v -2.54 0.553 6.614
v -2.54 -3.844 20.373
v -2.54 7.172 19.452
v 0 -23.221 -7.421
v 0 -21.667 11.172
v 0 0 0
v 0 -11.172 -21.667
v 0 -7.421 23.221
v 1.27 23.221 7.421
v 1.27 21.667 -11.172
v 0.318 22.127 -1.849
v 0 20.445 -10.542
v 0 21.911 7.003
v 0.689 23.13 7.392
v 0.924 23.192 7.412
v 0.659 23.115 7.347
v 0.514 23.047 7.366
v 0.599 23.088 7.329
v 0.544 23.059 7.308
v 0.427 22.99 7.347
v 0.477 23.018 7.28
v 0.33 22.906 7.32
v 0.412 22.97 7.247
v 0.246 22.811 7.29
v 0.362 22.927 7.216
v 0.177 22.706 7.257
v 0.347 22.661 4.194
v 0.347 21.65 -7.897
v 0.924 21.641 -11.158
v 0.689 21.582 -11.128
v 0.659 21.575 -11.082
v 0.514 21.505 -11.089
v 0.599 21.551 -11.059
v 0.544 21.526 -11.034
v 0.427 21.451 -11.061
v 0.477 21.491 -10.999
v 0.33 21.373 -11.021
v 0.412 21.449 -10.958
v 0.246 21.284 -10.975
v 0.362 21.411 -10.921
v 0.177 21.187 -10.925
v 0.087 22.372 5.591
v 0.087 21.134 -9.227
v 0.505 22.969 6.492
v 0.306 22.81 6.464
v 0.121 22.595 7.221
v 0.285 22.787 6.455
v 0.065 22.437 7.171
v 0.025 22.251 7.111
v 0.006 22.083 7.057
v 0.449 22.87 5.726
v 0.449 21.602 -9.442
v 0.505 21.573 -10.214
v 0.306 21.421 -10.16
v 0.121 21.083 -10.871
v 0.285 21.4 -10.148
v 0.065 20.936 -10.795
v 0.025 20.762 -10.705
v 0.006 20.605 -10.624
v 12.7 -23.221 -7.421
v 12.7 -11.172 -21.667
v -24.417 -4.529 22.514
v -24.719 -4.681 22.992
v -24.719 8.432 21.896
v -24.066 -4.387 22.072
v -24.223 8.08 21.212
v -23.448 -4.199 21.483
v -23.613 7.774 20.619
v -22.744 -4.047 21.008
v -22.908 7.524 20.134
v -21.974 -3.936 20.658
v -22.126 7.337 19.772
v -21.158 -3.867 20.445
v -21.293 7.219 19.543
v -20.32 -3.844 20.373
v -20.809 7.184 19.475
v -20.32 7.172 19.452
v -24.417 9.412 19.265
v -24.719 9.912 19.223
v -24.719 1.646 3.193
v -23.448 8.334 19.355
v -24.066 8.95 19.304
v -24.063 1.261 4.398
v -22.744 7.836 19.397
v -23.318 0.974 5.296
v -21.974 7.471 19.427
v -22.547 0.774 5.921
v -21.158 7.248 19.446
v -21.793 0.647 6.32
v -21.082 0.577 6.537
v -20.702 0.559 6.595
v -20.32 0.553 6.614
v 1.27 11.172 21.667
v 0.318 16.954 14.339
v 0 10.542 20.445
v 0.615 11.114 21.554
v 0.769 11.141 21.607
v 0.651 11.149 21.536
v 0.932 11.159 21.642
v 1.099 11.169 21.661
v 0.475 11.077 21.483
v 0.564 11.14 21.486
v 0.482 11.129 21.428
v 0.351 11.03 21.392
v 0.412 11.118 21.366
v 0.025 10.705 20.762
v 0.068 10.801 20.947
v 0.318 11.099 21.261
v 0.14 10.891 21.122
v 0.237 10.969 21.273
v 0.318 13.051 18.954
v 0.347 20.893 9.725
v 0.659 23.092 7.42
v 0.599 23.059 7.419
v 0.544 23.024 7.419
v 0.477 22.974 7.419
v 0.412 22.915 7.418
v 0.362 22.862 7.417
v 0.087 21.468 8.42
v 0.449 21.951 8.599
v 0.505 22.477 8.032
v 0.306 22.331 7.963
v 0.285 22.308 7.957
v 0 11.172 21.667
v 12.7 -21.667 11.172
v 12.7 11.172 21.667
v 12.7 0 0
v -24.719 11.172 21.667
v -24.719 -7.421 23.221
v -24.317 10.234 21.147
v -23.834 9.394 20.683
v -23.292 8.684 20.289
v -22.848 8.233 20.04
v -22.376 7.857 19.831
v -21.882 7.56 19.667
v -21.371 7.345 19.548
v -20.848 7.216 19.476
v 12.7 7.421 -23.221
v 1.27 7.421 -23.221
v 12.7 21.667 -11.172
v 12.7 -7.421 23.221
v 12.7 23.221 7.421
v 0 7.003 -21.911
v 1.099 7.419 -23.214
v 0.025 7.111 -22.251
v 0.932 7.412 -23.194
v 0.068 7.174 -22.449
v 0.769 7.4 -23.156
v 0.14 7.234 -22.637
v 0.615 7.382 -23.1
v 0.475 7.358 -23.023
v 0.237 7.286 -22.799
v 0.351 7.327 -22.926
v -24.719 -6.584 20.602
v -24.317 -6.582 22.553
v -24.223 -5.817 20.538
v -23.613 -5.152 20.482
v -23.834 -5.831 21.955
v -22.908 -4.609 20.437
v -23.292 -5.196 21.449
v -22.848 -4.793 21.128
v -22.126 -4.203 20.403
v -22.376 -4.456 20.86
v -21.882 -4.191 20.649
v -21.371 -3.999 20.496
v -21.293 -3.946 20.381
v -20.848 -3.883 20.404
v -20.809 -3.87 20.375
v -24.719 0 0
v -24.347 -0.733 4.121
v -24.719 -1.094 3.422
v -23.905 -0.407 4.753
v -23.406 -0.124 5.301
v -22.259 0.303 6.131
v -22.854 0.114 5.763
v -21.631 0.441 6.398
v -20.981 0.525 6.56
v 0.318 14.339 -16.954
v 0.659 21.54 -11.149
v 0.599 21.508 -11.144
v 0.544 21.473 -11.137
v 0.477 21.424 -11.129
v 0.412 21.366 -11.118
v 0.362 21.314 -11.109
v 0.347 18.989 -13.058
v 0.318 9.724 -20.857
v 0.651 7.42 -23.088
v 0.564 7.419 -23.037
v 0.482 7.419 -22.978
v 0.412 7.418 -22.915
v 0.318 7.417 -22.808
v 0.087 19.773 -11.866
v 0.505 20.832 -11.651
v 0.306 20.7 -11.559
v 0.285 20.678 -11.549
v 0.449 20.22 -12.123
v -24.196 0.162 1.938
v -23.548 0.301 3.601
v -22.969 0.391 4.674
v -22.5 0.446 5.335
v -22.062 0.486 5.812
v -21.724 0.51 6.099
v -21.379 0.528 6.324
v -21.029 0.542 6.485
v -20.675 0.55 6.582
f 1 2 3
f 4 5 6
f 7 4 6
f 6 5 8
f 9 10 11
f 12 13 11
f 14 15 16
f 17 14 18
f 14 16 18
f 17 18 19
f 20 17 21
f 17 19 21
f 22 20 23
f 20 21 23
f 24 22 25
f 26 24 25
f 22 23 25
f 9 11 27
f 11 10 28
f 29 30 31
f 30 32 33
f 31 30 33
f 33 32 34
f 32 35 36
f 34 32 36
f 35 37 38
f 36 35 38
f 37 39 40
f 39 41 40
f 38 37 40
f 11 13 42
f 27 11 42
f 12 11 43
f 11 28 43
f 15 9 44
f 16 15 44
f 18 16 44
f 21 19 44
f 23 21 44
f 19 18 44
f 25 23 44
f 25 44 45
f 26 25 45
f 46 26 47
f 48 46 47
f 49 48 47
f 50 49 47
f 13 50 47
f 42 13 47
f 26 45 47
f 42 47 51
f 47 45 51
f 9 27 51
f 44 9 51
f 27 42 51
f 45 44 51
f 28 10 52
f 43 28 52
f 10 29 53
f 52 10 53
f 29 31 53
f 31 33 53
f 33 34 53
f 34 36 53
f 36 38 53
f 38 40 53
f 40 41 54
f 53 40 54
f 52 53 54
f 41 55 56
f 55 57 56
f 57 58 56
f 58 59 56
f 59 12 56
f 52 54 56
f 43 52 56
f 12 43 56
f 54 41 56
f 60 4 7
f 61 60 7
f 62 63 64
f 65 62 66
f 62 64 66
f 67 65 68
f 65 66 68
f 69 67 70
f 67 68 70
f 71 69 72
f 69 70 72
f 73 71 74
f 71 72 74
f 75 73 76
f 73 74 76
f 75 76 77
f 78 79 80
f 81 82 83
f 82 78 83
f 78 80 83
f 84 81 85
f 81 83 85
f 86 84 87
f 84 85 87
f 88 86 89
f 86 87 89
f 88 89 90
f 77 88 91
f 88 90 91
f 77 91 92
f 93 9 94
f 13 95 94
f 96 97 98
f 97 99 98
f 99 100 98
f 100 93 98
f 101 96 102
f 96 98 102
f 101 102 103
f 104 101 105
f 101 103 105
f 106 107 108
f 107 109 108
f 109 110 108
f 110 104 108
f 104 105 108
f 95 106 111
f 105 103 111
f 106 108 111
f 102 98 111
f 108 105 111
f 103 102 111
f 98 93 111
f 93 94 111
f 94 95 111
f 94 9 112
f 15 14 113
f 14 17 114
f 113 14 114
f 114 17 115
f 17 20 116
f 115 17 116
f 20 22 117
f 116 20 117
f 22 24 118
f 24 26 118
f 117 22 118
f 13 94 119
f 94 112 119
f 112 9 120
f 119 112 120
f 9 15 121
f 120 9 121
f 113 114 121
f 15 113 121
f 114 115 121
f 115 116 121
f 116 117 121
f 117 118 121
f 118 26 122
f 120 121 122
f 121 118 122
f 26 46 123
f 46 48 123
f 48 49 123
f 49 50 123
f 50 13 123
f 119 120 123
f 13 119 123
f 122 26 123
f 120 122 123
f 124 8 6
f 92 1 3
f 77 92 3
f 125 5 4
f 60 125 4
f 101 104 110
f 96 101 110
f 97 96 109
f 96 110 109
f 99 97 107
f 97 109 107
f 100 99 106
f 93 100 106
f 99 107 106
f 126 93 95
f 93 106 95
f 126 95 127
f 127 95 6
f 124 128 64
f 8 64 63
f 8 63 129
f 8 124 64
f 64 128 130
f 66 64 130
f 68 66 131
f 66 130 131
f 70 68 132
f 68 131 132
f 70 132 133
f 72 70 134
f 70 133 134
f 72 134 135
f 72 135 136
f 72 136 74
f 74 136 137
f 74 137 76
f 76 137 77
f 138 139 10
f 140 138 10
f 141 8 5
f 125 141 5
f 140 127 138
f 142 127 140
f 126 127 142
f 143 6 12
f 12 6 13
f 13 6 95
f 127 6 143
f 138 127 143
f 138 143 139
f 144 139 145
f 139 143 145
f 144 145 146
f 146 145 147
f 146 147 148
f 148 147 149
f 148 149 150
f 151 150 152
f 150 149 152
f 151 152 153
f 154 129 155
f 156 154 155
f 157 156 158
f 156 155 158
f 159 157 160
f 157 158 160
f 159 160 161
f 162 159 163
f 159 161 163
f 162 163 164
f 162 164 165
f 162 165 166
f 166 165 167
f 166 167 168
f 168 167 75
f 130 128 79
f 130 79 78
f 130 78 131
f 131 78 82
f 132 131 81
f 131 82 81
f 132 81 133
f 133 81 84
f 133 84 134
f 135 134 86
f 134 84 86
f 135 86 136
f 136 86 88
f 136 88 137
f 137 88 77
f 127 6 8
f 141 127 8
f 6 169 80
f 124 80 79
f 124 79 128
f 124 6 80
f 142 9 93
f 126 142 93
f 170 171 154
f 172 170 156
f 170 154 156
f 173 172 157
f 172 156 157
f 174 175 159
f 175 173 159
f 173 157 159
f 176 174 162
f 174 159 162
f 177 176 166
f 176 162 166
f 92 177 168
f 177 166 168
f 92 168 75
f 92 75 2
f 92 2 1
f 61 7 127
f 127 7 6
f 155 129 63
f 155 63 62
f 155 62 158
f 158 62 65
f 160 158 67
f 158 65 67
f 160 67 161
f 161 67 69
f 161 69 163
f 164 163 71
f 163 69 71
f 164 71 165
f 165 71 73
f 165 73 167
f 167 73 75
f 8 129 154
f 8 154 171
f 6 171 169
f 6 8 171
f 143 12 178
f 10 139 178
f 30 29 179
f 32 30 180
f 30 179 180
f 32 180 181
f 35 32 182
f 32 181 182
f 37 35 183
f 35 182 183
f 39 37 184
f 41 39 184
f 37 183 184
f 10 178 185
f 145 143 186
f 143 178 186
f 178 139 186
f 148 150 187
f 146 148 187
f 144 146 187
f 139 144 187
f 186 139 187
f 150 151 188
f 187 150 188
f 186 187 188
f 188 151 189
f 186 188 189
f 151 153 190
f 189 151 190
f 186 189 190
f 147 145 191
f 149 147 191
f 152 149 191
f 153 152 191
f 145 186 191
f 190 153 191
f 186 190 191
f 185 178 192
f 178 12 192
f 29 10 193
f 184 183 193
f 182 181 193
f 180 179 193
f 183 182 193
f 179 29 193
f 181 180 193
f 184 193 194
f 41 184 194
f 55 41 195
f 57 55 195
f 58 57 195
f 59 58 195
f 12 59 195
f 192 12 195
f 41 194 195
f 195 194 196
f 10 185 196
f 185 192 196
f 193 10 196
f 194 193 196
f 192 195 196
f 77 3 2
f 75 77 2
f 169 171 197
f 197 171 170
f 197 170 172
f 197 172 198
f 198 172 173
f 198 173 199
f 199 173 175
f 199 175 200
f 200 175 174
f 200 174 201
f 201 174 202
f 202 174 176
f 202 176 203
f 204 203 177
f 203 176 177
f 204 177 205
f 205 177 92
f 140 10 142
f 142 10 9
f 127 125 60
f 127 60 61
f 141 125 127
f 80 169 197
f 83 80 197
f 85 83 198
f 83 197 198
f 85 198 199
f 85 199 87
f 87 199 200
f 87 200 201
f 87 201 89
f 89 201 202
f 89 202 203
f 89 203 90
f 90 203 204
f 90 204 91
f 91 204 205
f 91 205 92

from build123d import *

# Parameters (mm, degrees)
F1_DEPTH     = 12.7
F2_DEPTH     = 25.4
F3_T1_DEPTH  = 25.0079243049
F3_T3_DEPTH  = 25.0079243049
F3_T5_DEPTH  = 25.0079243049
F4_T         = -2.54
F5_T4_DEPTH  = 36.4551670306
F5_T10_DEPTH = 39.8442718127
F5_T16_DEPTH = 39.8442718127
F5_T23_DEPTH = 36.4551670306
F5_T29_DEPTH = 39.8442718127
F5_T38_DEPTH = 36.4551670306
F5_T44_DEPTH = 39.8442718127
F5_T53_DEPTH = 39.8442718127
F5_T59_DEPTH = 39.8442718127


# Not quite as in the source:
# - a fillet or chamfer that OpenCascade refuses, or shapes differently, is made with other operations: its cross-section is extruded or revolved along the edge and cut away or added


with BuildPart() as f1:
    # F0 (on Right) → F1 (new body)
    with BuildSketch(Plane.YZ):
        Polygon((-7.4210610107, 23.220738357), (-21.6670241207, 11.1720589921), (-23.220738357, -7.4210610107), (-11.1720589921, -21.6670241207), (0, 0), align=None)
    extrude(amount=F1_DEPTH)


with BuildPart() as f1b:
    # F0 (on Right) → F1, piece 2 (new body)
    with BuildSketch(Plane.YZ):
        Polygon((23.220738357, 7.4210610107), (11.1720589921, 21.6670241207), (0, 0), (7.4210610107, -23.220738357), (21.6670241207, -11.1720589921), align=None)
    extrude(amount=F1_DEPTH)

    # F3: fillet of radius 1.27 on 3 edges, made by hand

    # F3_s2 → F3_t1 (cut)
    with BuildSketch(Plane(origin=(0, -9.5472026063, -8.074651194), x_dir=(1, 0, 0), z_dir=(0, 0.7635341894, 0.6457674052))):
        with BuildLine():
            add(Edge.make_bspline(
                [(1.27, 22.5221069513), (0, 22.5221069513), (0, 21.2521069513)],
                knots=[0, 0, 0, 1, 1, 1], degree=2, weights=[1, 1, 1]))
            Line((0, 21.2521069513), (0, 22.5221069513))
            Line((0, 22.5221069513), (1.27, 22.5221069513))
        make_face()
    extrude(amount=F3_T1_DEPTH, mode=Mode.SUBTRACT)

    # F3_s4 → F3_t3 (cut)
    with BuildSketch(Plane(origin=(0, -1.0412510893, -12.4605323193), x_dir=(1, 0, 0), z_dir=(0, 0.0832736917, 0.9965267143))):
        with BuildLine():
            add(Edge.make_bspline(
                [(1.27, 22.5221069513), (0, 22.5221069513), (0, 21.2521069513)],
                knots=[0, 0, 0, 1, 1, 1], degree=2, weights=[1, 1, 1]))
            Line((0, 21.2521069513), (0, 22.5221069513))
            Line((0, 22.5221069513), (1.27, 22.5221069513))
        make_face()
    extrude(amount=F3_T3_DEPTH, mode=Mode.SUBTRACT)

    # F3_s6 → F3_t5 (cut)
    with BuildSketch(Plane(origin=(0, 8.074651194, -9.5472026063), x_dir=(1, 0, 0), z_dir=(0, -0.6457674052, 0.7635341894))):
        with BuildLine():
            add(Edge.make_bspline(
                [(1.27, 22.5221069513), (0, 22.5221069513), (0, 21.2521069513)],
                knots=[0, 0, 0, 1, 1, 1], degree=2, weights=[1, 1, 1]))
            Line((0, 21.2521069513), (0, 22.5221069513))
            Line((0, 22.5221069513), (1.27, 22.5221069513))
        make_face()
    extrude(amount=F3_T5_DEPTH, mode=Mode.SUBTRACT)


with BuildPart() as f2:
    # F0 (on Right) → F2 (new body)
    with BuildSketch(Plane.YZ):
        Polygon((11.1720589921, 21.6670241207), (-7.4210610107, 23.220738357), (0, 0), align=None)
    extrude(amount=-F2_DEPTH)

    # F4
    f4_openings = [f2.faces().sort_by_distance(p)[0] for p in [
        (-25.4, 1.250333, 14.962587),
    ]]
    offset(amount=F4_T, openings=f4_openings)

    # F5: fillet of radius 5.08 on 3 edges, made by hand


with BuildPart() as f5_tool2:
    # F5_s3 → F5_t4 (new body)
    with BuildSketch(Plane(origin=(0, 18.1642739097, -1.5178781701), x_dir=(1, 0, 0), z_dir=(0, -0.9965267143, 0.0832736917))):
        with BuildLine():
            ThreePointArc((-25.4, 25.0621069513), (-23.9121024484, 21.4700045029), (-20.32, 19.9821069513))
            Line((-20.32, 19.9821069513), (-25.4, 19.9821069513))
            Line((-25.4, 19.9821069513), (-25.4, 25.0621069513))
        make_face()
    extrude(amount=F5_T4_DEPTH)

    split(bisect_by=Plane(origin=(0, 2.4194467666, 0.7732252864), x_dir=(1, 0, 0), z_dir=(0, 0.9525380971, 0.3044194041)), keep=Keep.TOP)

    split(bisect_by=Plane(origin=(0, -2.2575600588, 1.164054372), x_dir=(1, 0, 0), z_dir=(0, -0.8888031728, 0.4582891228)), keep=Keep.TOP)


with BuildPart() as f2_1:
    add(f2.part)

    # F5_t1: cut F5_tool2
    add(f5_tool2.part, mode=Mode.SUBTRACT)


with BuildPart() as f5_tool8:
    # F5_s9 → F5_t10 (new body)
    with BuildSketch(Plane(origin=(0, -3.0099960077, -5.8375681822), x_dir=(1, 0, 0), z_dir=(0, 0.4582891228, 0.8888031728))):
        with BuildLine():
            ThreePointArc((-25.4, 2.54), (-23.9121024484, -1.0521024484), (-20.32, -2.54))
            Line((-20.32, -2.54), (-25.4, -2.54))
            Line((-25.4, -2.54), (-25.4, 2.54))
        make_face()
    extrude(amount=F5_T10_DEPTH)

    split(bisect_by=Plane(origin=(0, 1.6639838138, 19.9127033846), x_dir=(1, 0, 0), z_dir=(0, -0.0832736917, -0.9965267143)), keep=Keep.TOP)

    split(bisect_by=Plane(origin=(0, 2.4194467666, 0.7732252864), x_dir=(1, 0, 0), z_dir=(0, 0.9525380971, 0.3044194041)), keep=Keep.TOP)


with BuildPart() as f2_2:
    add(f2_1.part)

    # F5_t7: cut F5_tool8
    add(f5_tool8.part, mode=Mode.SUBTRACT)


with BuildPart() as f5_tool14:
    # F5_s15 → F5_t16 (new body)
    with BuildSketch(Plane(origin=(0, -10.1299740234, 31.6970142166), x_dir=(1, 0, 0), z_dir=(0, 0.3044194041, -0.9525380971))):
        with BuildLine():
            ThreePointArc((-25.4, 2.54), (-23.9121024484, -1.0521024484), (-20.32, -2.54))
            Line((-20.32, -2.54), (-25.4, -2.54))
            Line((-25.4, -2.54), (-25.4, 2.54))
        make_face()
    extrude(amount=F5_T16_DEPTH)

    split(bisect_by=Plane(origin=(0, 1.6639838138, 19.9127033846), x_dir=(1, 0, 0), z_dir=(0, -0.0832736917, -0.9965267143)), keep=Keep.TOP)

    split(bisect_by=Plane(origin=(0, -2.2575600588, 1.164054372), x_dir=(1, 0, 0), z_dir=(0, -0.8888031728, 0.4582891228)), keep=Keep.TOP)


with BuildPart() as f2_3:
    add(f2_2.part)

    # F5_t13: cut F5_tool14
    add(f5_tool14.part, mode=Mode.SUBTRACT)


with BuildPart() as f5_tool21:
    # F5_s22 → F5_t23 (new body)
    with BuildSketch(Plane(origin=(0, 18.1642739097, -1.5178781701), x_dir=(1, 0, 0), z_dir=(0, -0.9965267143, 0.0832736917))):
        with BuildLine():
            ThreePointArc((-25.4, 25.0621069513), (-23.9121024484, 21.4700045029), (-20.32, 19.9821069513))
            Line((-20.32, 19.9821069513), (-25.4, 19.9821069513))
            Line((-25.4, 19.9821069513), (-25.4, 25.0621069513))
        make_face()
    extrude(amount=F5_T23_DEPTH)

    split(bisect_by=Plane(origin=(0, 1.8754989907, 22.4438812388), x_dir=(1, 0, 0), z_dir=(0, -0.0832736917, -0.9965267143)), keep=Keep.TOP)

    split(bisect_by=Plane(origin=(0, 0, 0), x_dir=(1, 0, 0), z_dir=(0, -0.8888031728, 0.4582891228)), keep=Keep.TOP)

    split(bisect_by=Plane(origin=(0, -2.2575600588, 1.164054372), x_dir=(1, 0, 0), z_dir=(0, 0.8888031728, -0.4582891228)), keep=Keep.TOP)


with BuildPart() as f5_tool27:
    # F5_s28 → F5_t29 (new body)
    with BuildSketch(Plane(origin=(0, -3.0099960077, -5.8375681822), x_dir=(1, 0, 0), z_dir=(0, 0.4582891228, 0.8888031728))):
        with BuildLine():
            ThreePointArc((-25.4, 2.54), (-23.9121024484, -1.0521024484), (-20.32, -2.54))
            Line((-20.32, -2.54), (-25.4, -2.54))
            Line((-25.4, -2.54), (-25.4, 2.54))
        make_face()
    extrude(amount=F5_T29_DEPTH)

    split(bisect_by=Plane(origin=(0, 1.8754989907, 22.4438812388), x_dir=(1, 0, 0), z_dir=(0, -0.0832736917, -0.9965267143)), keep=Keep.TOP)

    split(bisect_by=Plane(origin=(0, 0, 0), x_dir=(1, 0, 0), z_dir=(0, -0.8888031728, 0.4582891228)), keep=Keep.TOP)

    split(bisect_by=Plane(origin=(0, 1.6639838138, 19.9127033846), x_dir=(1, 0, 0), z_dir=(0, 0.0832736917, 0.9965267143)), keep=Keep.TOP)


with BuildPart() as f5_tool21_1:
    add(f5_tool21.part)

    # F5_t33: intersect F5_tool27
    add(f5_tool27.part, mode=Mode.INTERSECT)


with BuildPart() as f2_4:
    add(f2_3.part)

    # F5_t19: cut F5_tool21
    add(f5_tool21_1.part, mode=Mode.SUBTRACT)


with BuildPart() as f5_tool36:
    # F5_s37 → F5_t38 (new body)
    with BuildSketch(Plane(origin=(0, 18.1642739097, -1.5178781701), x_dir=(1, 0, 0), z_dir=(0, -0.9965267143, 0.0832736917))):
        with BuildLine():
            ThreePointArc((-25.4, 25.0621069513), (-23.9121024484, 21.4700045029), (-20.32, 19.9821069513))
            Line((-20.32, 19.9821069513), (-25.4, 19.9821069513))
            Line((-25.4, 19.9821069513), (-25.4, 25.0621069513))
        make_face()
    extrude(amount=F5_T38_DEPTH)

    split(bisect_by=Plane(origin=(0, 1.8754989907, 22.4438812388), x_dir=(1, 0, 0), z_dir=(0, -0.0832736917, -0.9965267143)), keep=Keep.TOP)

    split(bisect_by=Plane(origin=(0, 0, 0), x_dir=(1, 0, 0), z_dir=(0, 0.9525380971, 0.3044194041)), keep=Keep.TOP)

    split(bisect_by=Plane(origin=(0, 2.4194467666, 0.7732252864), x_dir=(1, 0, 0), z_dir=(0, -0.9525380971, -0.3044194041)), keep=Keep.TOP)


with BuildPart() as f5_tool42:
    # F5_s43 → F5_t44 (new body)
    with BuildSketch(Plane(origin=(0, -10.1299740234, 31.6970142166), x_dir=(1, 0, 0), z_dir=(0, 0.3044194041, -0.9525380971))):
        with BuildLine():
            ThreePointArc((-25.4, 2.54), (-23.9121024484, -1.0521024484), (-20.32, -2.54))
            Line((-20.32, -2.54), (-25.4, -2.54))
            Line((-25.4, -2.54), (-25.4, 2.54))
        make_face()
    extrude(amount=F5_T44_DEPTH)

    split(bisect_by=Plane(origin=(0, 1.8754989907, 22.4438812388), x_dir=(1, 0, 0), z_dir=(0, -0.0832736917, -0.9965267143)), keep=Keep.TOP)

    split(bisect_by=Plane(origin=(0, 0, 0), x_dir=(1, 0, 0), z_dir=(0, 0.9525380971, 0.3044194041)), keep=Keep.TOP)

    split(bisect_by=Plane(origin=(0, 1.6639838138, 19.9127033846), x_dir=(1, 0, 0), z_dir=(0, 0.0832736917, 0.9965267143)), keep=Keep.TOP)


with BuildPart() as f5_tool36_1:
    add(f5_tool36.part)

    # F5_t48: intersect F5_tool42
    add(f5_tool42.part, mode=Mode.INTERSECT)


with BuildPart() as f2_5:
    add(f2_4.part)

    # F5_t34: cut F5_tool36
    add(f5_tool36_1.part, mode=Mode.SUBTRACT)


with BuildPart() as f5_tool51:
    # F5_s52 → F5_t53 (new body)
    with BuildSketch(Plane(origin=(0, -3.0099960077, -5.8375681822), x_dir=(1, 0, 0), z_dir=(0, 0.4582891228, 0.8888031728))):
        with BuildLine():
            ThreePointArc((-25.4, 2.54), (-23.9121024484, -1.0521024484), (-20.32, -2.54))
            Line((-20.32, -2.54), (-25.4, -2.54))
            Line((-25.4, -2.54), (-25.4, 2.54))
        make_face()
    extrude(amount=F5_T53_DEPTH)

    split(bisect_by=Plane(origin=(0, 0, 0), x_dir=(1, 0, 0), z_dir=(0, 0.9525380971, 0.3044194041)), keep=Keep.TOP)

    split(bisect_by=Plane(origin=(0, 0, 0), x_dir=(1, 0, 0), z_dir=(0, -0.8888031728, 0.4582891228)), keep=Keep.TOP)

    split(bisect_by=Plane(origin=(0, 2.4194467666, 0.7732252864), x_dir=(1, 0, 0), z_dir=(0, -0.9525380971, -0.3044194041)), keep=Keep.TOP)


with BuildPart() as f5_tool57:
    # F5_s58 → F5_t59 (new body)
    with BuildSketch(Plane(origin=(0, -10.1299740234, 31.6970142166), x_dir=(1, 0, 0), z_dir=(0, 0.3044194041, -0.9525380971))):
        with BuildLine():
            ThreePointArc((-25.4, 2.54), (-23.9121024484, -1.0521024484), (-20.32, -2.54))
            Line((-20.32, -2.54), (-25.4, -2.54))
            Line((-25.4, -2.54), (-25.4, 2.54))
        make_face()
    extrude(amount=F5_T59_DEPTH)

    split(bisect_by=Plane(origin=(0, 0, 0), x_dir=(1, 0, 0), z_dir=(0, 0.9525380971, 0.3044194041)), keep=Keep.TOP)

    split(bisect_by=Plane(origin=(0, 0, 0), x_dir=(1, 0, 0), z_dir=(0, -0.8888031728, 0.4582891228)), keep=Keep.TOP)

    split(bisect_by=Plane(origin=(0, -2.2575600588, 1.164054372), x_dir=(1, 0, 0), z_dir=(0, 0.8888031728, -0.4582891228)), keep=Keep.TOP)


with BuildPart() as f5_tool51_1:
    add(f5_tool51.part)

    # F5_t63: intersect F5_tool57
    add(f5_tool57.part, mode=Mode.INTERSECT)


with BuildPart() as f2_6:
    add(f2_5.part)

    # F5_t49: cut F5_tool51
    add(f5_tool51_1.part, mode=Mode.SUBTRACT)


solid = Compound([f1.part, f1b.part, f2_6.part])
